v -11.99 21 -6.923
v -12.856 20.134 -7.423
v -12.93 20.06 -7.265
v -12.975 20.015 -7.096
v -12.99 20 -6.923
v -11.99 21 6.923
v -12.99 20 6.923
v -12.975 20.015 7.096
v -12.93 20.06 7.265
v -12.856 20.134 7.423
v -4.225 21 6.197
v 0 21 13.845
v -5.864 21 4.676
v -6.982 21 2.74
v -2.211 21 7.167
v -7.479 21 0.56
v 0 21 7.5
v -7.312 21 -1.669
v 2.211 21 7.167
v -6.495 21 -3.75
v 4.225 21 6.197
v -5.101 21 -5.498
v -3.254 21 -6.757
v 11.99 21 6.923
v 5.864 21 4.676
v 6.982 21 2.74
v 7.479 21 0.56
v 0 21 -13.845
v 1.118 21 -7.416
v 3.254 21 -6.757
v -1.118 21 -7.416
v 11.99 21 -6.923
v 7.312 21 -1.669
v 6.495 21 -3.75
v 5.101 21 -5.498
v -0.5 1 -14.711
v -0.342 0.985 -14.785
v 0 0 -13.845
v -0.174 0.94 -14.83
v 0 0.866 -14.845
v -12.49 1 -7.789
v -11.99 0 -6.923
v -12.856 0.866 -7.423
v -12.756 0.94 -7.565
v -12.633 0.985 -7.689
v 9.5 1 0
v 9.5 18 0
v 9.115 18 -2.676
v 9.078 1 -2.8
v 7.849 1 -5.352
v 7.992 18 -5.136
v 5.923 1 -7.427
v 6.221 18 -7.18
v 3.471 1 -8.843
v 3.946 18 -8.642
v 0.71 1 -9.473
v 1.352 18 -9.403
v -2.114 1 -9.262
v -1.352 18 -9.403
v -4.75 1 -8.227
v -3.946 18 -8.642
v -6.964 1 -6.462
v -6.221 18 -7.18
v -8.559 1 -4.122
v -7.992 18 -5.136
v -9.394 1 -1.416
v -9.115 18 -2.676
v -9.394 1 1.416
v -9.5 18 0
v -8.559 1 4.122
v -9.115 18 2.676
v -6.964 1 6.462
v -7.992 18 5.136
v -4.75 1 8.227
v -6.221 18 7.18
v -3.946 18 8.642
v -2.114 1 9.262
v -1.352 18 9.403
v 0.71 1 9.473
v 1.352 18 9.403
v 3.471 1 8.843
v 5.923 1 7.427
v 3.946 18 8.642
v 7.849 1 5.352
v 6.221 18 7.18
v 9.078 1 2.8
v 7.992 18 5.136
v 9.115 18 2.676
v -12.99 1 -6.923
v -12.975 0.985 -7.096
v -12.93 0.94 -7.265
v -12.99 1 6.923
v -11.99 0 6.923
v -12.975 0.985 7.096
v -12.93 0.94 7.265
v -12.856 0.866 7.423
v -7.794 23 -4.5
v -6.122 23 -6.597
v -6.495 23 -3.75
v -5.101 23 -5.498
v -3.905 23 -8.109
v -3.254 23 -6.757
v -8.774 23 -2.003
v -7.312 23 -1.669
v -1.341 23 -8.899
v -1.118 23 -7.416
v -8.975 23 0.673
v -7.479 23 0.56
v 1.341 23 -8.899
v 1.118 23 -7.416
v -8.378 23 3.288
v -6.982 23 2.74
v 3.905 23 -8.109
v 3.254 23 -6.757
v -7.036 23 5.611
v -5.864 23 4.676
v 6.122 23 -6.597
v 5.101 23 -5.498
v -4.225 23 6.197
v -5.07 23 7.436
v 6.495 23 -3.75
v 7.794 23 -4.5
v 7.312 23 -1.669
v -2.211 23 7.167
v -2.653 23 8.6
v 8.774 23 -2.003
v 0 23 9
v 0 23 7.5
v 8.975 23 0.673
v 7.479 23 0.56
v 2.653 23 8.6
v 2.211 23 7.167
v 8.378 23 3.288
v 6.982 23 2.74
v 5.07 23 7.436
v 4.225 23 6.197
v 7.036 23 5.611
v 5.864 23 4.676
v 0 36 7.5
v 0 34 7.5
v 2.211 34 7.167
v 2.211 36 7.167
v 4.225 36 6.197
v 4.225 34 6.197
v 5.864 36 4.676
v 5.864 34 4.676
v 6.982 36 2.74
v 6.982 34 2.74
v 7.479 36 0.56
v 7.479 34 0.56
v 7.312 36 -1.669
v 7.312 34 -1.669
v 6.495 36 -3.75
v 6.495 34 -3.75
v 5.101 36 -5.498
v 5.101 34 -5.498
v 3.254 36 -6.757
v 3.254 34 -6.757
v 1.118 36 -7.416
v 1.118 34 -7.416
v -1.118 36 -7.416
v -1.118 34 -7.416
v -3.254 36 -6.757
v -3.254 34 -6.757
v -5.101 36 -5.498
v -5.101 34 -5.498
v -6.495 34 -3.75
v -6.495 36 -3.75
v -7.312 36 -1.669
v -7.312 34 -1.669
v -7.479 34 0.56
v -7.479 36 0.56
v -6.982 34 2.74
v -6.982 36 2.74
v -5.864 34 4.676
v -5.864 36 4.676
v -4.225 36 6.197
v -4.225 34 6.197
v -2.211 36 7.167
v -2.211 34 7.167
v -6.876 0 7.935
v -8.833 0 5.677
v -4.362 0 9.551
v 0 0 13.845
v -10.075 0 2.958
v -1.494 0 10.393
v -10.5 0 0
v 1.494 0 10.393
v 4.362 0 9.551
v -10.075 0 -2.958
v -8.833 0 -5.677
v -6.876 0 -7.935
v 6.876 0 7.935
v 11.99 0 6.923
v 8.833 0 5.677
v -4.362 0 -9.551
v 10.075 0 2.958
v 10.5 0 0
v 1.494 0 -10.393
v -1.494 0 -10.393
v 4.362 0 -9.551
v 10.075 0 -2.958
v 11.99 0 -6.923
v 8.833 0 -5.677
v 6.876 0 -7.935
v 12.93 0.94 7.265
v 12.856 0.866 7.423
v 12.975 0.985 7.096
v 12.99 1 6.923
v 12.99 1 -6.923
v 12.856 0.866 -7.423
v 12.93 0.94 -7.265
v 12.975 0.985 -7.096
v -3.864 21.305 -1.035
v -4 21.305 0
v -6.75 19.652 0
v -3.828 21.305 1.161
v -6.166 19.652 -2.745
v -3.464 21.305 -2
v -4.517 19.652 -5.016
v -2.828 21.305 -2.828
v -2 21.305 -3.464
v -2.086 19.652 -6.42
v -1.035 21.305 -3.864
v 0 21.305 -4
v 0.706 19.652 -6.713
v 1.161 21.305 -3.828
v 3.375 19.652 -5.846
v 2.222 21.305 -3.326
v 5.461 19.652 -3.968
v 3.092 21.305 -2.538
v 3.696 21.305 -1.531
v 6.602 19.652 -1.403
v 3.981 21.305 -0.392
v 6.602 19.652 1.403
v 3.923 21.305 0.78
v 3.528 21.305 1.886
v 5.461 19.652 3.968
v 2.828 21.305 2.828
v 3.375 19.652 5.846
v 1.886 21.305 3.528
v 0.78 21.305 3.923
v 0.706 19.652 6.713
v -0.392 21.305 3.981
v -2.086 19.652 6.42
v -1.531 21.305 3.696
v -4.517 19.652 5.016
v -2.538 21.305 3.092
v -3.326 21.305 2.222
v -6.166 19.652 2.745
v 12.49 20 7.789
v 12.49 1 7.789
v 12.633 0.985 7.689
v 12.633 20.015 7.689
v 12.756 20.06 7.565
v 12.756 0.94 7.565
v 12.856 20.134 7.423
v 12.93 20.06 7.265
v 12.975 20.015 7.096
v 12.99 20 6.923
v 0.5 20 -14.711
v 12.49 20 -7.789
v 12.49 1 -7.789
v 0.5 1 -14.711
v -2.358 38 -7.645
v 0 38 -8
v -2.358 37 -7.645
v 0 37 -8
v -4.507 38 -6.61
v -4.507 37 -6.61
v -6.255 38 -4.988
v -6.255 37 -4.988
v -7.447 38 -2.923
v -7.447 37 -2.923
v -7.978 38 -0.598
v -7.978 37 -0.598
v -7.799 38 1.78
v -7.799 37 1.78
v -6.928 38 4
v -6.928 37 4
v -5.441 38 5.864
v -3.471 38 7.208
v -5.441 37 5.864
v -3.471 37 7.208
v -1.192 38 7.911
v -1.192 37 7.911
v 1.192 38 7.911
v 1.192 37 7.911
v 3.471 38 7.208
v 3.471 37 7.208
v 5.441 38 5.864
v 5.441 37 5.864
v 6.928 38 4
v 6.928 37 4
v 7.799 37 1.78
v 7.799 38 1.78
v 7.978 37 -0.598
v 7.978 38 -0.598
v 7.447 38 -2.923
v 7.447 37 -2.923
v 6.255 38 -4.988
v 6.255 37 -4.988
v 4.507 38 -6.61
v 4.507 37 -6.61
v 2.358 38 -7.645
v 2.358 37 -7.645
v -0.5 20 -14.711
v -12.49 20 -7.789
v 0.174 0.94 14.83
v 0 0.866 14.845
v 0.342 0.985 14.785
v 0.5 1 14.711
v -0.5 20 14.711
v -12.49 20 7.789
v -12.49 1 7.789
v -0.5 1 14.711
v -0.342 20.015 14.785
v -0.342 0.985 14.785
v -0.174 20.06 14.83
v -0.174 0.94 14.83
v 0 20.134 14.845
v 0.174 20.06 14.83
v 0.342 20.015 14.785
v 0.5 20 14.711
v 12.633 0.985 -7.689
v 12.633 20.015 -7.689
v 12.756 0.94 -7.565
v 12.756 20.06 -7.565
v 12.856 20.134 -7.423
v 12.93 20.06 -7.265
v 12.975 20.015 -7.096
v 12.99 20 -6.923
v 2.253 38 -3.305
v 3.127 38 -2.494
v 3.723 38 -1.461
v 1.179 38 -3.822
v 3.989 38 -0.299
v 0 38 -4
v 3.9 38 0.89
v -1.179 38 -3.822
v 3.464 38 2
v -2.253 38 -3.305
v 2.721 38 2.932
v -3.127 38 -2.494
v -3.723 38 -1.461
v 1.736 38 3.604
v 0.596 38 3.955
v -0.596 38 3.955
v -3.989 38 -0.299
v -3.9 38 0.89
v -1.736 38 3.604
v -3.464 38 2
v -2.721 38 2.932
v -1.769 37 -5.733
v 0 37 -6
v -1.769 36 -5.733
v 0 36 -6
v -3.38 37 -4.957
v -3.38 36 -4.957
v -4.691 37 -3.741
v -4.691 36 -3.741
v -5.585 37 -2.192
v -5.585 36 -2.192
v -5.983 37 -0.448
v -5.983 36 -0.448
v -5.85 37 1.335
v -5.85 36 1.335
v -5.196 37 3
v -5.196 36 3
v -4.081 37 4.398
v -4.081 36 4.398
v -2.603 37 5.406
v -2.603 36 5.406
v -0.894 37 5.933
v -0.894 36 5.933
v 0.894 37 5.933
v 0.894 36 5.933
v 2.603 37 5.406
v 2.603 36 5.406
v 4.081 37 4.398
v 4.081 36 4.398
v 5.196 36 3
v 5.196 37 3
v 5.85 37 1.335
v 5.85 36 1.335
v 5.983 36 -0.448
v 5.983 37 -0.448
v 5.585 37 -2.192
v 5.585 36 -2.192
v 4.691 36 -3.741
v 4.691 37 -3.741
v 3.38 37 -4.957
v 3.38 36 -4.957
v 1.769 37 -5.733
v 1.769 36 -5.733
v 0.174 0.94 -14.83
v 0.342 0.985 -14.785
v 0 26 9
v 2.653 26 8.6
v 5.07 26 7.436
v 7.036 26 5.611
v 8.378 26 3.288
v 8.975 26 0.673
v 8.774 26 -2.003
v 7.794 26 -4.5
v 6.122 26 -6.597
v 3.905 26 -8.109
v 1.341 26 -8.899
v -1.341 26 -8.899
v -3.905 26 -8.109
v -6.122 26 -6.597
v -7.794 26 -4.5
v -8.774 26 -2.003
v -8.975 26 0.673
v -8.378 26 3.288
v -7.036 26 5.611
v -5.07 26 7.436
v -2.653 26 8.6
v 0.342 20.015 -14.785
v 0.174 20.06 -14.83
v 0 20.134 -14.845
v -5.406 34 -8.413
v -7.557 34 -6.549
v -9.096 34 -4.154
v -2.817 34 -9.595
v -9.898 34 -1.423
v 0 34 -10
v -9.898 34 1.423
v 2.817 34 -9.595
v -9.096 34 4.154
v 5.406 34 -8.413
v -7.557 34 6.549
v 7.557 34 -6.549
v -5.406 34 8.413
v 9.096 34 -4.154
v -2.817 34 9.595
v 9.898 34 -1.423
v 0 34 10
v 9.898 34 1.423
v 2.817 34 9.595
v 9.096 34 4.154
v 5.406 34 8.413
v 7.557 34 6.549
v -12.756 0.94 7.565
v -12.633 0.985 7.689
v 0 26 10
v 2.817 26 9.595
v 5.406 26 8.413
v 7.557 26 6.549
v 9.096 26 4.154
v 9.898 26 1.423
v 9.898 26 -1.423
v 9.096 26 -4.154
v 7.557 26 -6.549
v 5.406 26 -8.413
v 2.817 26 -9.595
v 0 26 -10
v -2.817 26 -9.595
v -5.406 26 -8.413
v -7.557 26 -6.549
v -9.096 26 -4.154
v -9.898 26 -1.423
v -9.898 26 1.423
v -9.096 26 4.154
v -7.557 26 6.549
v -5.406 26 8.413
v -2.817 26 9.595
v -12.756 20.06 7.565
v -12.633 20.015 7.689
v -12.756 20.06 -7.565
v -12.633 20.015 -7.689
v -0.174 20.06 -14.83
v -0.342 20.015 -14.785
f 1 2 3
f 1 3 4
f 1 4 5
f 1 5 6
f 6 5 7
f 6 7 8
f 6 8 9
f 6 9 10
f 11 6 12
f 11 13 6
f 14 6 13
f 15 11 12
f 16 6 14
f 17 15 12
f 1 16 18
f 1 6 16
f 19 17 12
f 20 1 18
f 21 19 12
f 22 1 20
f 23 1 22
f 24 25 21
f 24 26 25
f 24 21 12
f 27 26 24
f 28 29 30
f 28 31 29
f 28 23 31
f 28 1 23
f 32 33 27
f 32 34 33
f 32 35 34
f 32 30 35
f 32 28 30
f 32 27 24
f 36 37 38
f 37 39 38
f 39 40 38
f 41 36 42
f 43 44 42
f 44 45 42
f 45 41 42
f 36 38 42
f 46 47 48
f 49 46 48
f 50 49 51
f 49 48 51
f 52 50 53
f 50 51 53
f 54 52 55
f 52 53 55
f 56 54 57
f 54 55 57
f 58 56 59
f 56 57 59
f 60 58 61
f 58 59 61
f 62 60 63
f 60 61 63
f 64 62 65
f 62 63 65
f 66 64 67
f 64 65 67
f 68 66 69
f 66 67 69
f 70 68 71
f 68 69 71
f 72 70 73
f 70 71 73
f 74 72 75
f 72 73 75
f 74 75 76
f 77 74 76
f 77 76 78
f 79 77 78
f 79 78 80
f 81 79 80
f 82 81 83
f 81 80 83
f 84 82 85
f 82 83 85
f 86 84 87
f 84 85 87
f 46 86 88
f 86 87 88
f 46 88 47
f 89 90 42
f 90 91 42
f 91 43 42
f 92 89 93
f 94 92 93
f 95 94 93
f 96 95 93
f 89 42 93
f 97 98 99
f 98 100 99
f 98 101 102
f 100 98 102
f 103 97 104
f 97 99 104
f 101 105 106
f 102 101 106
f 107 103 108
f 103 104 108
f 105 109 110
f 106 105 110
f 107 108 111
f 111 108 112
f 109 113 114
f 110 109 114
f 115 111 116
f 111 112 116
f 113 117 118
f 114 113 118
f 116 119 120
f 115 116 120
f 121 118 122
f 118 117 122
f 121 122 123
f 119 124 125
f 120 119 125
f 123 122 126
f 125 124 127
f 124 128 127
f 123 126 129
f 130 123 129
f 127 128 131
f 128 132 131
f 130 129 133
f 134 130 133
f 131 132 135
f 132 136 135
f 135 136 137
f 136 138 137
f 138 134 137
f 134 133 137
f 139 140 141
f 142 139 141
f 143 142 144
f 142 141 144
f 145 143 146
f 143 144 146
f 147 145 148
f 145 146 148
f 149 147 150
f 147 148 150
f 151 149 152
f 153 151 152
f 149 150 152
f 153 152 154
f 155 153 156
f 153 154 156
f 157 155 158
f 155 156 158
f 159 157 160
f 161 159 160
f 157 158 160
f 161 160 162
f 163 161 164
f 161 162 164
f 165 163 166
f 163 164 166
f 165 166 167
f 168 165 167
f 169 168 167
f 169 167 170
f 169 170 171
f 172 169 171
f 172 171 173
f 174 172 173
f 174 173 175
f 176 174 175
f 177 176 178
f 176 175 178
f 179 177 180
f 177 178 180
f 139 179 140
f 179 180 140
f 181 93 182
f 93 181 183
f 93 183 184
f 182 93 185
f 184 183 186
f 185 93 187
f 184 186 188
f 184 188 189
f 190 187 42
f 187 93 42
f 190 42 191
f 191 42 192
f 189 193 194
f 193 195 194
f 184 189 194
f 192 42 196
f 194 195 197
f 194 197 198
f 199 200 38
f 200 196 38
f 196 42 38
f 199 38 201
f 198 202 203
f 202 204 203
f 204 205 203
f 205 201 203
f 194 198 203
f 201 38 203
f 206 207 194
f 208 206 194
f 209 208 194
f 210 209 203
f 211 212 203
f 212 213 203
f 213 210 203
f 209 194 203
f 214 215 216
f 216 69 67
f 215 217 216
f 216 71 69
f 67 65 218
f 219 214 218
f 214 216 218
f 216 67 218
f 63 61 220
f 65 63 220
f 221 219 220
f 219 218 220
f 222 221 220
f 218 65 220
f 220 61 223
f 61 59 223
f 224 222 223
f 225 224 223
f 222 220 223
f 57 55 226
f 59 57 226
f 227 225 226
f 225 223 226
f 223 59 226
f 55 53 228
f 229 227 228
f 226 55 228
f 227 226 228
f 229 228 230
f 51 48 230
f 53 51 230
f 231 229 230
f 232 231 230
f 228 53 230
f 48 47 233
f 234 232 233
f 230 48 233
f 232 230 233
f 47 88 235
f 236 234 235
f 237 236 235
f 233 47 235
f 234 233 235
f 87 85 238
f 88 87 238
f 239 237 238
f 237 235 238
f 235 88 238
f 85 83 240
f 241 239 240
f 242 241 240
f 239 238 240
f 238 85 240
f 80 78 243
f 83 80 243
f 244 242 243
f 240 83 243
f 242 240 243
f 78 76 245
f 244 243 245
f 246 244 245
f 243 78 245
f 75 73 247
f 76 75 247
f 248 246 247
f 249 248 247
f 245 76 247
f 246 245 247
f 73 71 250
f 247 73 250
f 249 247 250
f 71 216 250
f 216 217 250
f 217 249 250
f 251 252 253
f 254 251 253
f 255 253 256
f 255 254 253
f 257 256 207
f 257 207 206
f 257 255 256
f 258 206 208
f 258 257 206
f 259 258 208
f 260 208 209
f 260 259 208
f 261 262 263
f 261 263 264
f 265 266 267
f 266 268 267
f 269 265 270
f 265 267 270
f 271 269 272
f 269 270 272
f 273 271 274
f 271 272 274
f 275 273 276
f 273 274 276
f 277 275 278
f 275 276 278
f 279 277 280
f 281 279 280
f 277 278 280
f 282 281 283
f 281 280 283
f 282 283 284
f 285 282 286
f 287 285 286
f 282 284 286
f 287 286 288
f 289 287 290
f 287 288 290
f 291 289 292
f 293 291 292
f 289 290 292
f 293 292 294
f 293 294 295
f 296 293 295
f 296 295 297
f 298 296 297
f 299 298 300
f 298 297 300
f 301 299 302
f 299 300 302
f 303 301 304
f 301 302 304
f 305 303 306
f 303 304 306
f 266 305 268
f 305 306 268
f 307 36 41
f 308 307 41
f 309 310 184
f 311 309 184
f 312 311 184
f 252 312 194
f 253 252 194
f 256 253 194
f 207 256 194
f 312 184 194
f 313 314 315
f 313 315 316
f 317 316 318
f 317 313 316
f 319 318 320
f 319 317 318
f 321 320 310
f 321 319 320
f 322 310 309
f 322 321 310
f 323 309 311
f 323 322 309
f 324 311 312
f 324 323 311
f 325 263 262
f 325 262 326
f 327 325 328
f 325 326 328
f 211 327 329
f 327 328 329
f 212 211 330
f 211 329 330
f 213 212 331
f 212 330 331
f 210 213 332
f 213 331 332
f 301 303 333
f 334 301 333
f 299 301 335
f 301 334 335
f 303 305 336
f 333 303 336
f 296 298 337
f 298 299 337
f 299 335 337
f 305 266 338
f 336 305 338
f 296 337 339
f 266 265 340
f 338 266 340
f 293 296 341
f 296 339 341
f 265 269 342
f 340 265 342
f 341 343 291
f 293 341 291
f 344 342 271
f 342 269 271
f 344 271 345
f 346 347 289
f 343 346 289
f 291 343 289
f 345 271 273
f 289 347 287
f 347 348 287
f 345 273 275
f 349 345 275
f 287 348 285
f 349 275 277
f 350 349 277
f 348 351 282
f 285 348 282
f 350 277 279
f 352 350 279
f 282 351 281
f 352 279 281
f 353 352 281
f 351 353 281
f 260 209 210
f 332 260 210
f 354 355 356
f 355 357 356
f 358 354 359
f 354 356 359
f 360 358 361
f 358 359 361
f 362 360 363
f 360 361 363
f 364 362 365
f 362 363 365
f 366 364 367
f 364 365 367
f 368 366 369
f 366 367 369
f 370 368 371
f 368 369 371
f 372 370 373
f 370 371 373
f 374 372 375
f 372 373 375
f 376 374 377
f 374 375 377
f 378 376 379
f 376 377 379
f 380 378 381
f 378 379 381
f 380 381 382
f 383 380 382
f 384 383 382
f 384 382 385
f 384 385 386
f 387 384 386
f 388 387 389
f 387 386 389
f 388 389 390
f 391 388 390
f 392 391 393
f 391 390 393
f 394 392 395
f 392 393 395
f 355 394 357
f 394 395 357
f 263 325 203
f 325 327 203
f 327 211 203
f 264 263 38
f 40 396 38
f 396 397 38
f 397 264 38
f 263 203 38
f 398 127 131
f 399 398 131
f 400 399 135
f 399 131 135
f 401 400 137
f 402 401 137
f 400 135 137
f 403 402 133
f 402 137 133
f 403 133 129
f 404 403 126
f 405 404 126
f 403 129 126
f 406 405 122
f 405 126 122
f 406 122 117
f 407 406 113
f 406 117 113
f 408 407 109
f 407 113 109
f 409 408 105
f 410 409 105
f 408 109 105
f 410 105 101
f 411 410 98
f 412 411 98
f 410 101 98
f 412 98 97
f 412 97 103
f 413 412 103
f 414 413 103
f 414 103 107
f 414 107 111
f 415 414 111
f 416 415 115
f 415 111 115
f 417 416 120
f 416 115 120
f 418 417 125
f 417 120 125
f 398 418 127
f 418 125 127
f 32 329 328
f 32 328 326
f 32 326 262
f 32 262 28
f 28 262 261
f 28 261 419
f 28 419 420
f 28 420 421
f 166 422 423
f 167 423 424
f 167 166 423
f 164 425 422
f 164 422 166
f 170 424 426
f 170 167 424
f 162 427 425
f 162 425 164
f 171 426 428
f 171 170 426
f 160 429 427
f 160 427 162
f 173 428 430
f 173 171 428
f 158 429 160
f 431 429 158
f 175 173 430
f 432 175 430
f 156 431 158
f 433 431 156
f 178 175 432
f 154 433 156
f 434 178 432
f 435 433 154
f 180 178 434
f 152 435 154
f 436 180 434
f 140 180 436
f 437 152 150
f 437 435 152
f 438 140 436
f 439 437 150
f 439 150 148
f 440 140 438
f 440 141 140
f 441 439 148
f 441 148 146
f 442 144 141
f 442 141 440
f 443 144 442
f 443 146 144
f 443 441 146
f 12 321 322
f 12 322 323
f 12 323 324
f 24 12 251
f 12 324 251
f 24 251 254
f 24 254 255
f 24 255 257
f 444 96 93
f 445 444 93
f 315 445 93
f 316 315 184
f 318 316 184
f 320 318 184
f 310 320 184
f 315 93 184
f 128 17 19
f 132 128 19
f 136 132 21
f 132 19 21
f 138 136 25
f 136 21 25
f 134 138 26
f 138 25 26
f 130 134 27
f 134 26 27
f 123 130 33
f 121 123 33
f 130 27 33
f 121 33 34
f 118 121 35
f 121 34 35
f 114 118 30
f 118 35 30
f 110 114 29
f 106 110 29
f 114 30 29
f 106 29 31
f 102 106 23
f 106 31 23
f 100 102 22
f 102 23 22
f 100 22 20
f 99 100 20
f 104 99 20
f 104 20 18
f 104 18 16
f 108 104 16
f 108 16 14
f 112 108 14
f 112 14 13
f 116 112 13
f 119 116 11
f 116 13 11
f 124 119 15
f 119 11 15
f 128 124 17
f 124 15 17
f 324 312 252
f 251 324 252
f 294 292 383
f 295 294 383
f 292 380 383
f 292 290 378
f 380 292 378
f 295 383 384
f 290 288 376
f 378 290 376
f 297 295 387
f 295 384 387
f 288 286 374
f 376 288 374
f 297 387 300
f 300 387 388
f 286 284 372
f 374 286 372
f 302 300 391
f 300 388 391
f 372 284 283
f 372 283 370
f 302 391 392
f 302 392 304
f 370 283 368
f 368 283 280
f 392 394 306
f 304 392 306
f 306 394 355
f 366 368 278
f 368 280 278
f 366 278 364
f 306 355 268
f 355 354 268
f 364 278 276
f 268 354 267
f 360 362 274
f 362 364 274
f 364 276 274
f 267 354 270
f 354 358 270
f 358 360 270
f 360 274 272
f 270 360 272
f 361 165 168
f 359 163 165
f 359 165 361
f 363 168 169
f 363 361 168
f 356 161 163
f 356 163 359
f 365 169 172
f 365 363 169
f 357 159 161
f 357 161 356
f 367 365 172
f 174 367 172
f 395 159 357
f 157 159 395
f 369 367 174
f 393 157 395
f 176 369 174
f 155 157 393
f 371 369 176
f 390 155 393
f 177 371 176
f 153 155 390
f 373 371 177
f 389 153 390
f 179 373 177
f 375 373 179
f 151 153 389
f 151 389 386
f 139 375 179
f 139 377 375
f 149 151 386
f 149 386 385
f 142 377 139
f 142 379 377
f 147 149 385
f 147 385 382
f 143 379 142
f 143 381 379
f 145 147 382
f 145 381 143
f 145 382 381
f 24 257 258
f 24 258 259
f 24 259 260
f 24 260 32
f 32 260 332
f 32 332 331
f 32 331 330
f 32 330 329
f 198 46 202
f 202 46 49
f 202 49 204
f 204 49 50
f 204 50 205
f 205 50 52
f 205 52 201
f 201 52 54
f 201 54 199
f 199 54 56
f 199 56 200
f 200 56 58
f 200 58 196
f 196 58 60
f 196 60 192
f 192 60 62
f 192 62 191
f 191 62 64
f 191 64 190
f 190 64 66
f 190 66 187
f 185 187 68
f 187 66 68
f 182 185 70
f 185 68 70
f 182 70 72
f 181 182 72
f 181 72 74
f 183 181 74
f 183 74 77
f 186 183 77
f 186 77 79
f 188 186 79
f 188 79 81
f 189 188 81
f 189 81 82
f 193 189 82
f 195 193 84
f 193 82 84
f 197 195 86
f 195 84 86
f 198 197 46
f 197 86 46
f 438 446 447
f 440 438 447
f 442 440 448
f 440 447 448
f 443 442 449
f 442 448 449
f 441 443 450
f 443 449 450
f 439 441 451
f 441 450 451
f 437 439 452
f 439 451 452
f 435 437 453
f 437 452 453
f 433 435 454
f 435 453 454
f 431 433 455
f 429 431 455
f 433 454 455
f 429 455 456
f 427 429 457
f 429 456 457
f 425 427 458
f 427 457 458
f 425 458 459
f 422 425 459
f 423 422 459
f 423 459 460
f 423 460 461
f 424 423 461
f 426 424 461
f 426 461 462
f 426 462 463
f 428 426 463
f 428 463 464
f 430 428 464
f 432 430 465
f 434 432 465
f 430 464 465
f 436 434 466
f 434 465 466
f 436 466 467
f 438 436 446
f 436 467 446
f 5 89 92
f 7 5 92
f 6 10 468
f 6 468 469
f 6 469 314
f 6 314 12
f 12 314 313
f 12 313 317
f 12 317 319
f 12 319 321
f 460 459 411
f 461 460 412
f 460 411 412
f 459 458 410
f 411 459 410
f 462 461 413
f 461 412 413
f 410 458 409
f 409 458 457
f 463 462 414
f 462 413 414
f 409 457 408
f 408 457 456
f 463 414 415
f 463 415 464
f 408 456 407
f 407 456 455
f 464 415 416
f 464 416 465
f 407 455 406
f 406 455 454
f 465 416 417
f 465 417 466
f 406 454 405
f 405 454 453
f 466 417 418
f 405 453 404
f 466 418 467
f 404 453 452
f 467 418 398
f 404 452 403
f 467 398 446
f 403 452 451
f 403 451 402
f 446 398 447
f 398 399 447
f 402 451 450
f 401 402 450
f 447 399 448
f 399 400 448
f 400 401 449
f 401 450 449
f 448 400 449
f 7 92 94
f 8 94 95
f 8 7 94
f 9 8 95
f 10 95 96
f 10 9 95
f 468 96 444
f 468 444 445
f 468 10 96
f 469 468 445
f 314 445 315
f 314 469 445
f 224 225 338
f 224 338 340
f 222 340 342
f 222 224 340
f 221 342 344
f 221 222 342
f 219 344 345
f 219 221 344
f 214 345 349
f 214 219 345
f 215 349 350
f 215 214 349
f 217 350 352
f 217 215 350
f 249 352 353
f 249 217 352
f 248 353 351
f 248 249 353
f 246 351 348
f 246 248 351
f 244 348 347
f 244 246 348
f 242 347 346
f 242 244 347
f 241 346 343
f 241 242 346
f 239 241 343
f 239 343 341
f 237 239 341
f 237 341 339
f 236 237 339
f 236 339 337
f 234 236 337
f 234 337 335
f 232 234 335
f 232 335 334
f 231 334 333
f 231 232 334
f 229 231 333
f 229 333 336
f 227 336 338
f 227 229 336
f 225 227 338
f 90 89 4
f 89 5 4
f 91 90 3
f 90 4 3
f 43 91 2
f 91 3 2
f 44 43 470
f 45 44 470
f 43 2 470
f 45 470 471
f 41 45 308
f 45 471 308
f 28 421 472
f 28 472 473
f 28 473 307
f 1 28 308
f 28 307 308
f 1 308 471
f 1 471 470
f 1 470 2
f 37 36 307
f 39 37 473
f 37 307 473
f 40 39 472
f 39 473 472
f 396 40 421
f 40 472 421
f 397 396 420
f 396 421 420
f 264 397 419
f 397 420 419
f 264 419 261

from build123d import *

# Parameters (mm, degrees)
EXTRUDE_1_DEPTH          = 21
SKETCH_2_R               = 7.5
EXTRUDE_2_DEPTH          = 2
SKETCH_3_R               = 9
EXTRUDE_3_DEPTH          = 3
SKETCH_4_R               = 10
EXTRUDE_4_DEPTH          = 8
SKETCH_5_R               = 7.5
EXTRUDE_5_DEPTH          = 2
CUT_EXTRUDE_1_DEPTH      = 42.106568818
CUT_EXTRUDE_1_DEPTH_BACK = 42.106568818
SKETCH_7_R               = 4
HOLE_WIZARD_G1_21_D      = 19
HOLE_WIZARD_G1_21_DEPTH  = 18
HOLE_WIZARD_G1_21_TIP    = 5.708175881
CHAMFER_1_SIZE           = 1
FILLET_1_R               = 1


with BuildPart() as part:
    # Эскиз1 → Бобышка-Вытянуть1 (new body)
    with BuildSketch(Plane(origin=(0, 0, 0), x_dir=(1, 0, 0), z_dir=(0, 1, 0))):
        Polygon((0, 15), (-12.990381057, 7.5), (-12.990381057, -7.5), (0, -15), (12.990381057, -7.5), (12.990381057, 7.5), align=None)
    extrude(amount=EXTRUDE_1_DEPTH)

    # Эскиз2 → Бобышка-Вытянуть2 (add)
    with BuildSketch(Plane(origin=(0, 21, 0), x_dir=(1, 0, 0), z_dir=(0, 1, 0))):
        with Locations(Location((0, 0, 0), (0, 0, 270))):
            Circle(SKETCH_2_R)
    extrude(amount=EXTRUDE_2_DEPTH)

    # Эскиз3 → Бобышка-Вытянуть3 (add)
    with BuildSketch(Plane(origin=(0, 23, 0), x_dir=(1, 0, 0), z_dir=(0, 1, 0))):
        with Locations(Location((0, 0, 0), (0, 0, 270))):
            Circle(SKETCH_3_R)
    extrude(amount=EXTRUDE_3_DEPTH)

    # Эскиз4 → Бобышка-Вытянуть4 (add)
    with BuildSketch(Plane(origin=(0, 26, 0), x_dir=(1, 0, 0), z_dir=(0, 1, 0))):
        with Locations(Location((0, 0, 0), (0, 0, 270))):
            Circle(SKETCH_4_R)
    extrude(amount=EXTRUDE_4_DEPTH)

    # Эскиз5 → Бобышка-Вытянуть5 (add)
    with BuildSketch(Plane(origin=(0, 34, 0), x_dir=(1, 0, 0), z_dir=(0, 1, 0))):
        with Locations(Location((0, 0, 0), (0, 0, 270))):
            Circle(SKETCH_5_R)
    extrude(amount=EXTRUDE_5_DEPTH)

    # Эскиз6 → Повернуть1 (revolve)
    with BuildSketch(Plane.XY, mode=Mode.PRIVATE) as revolve_1_sk:
        Polygon((-8, 37), (-6, 37), (-6, 36), (-4, 36), (-4, 38), (-8, 38), align=None)
    revolve(revolve_1_sk.sketch.rotate(Axis((0, 36, 0), (0, 1, 0)), 270), axis=Axis((0, 36, 0), (0, 1, 0)))

    # Эскиз7 → Вырез-Вытянуть1 (cut, two sides: drawn at the far end of the back side and taken through both)
    with BuildSketch(Plane(origin=(0, 36, 0), x_dir=(1, 0, 0), z_dir=(0, 1, 0)).offset(-CUT_EXTRUDE_1_DEPTH_BACK)):
        with Locations(Location((0, 0, 0), (0, 0, 90))):
            Circle(SKETCH_7_R)
    extrude(amount=CUT_EXTRUDE_1_DEPTH + CUT_EXTRUDE_1_DEPTH_BACK, mode=Mode.SUBTRACT)

    # Отверстие обработанное метчиком G1/21
    with Locations(Plane(origin=(0, 0, 0), x_dir=(-1, 0, 0), z_dir=(0, -1, 0))):
        with Locations((0, 0)):
            Hole(HOLE_WIZARD_G1_21_D / 2, depth=HOLE_WIZARD_G1_21_DEPTH)
            with Locations((0, 0, -(HOLE_WIZARD_G1_21_DEPTH + HOLE_WIZARD_G1_21_TIP / 2))):  # 118° drill point
                Cone(0, HOLE_WIZARD_G1_21_D / 2, HOLE_WIZARD_G1_21_TIP, mode=Mode.SUBTRACT)

    # Фаска1
    chamfer_1_edges = [part.edges().sort_by_distance(p)[0] for p in [
        (-12.990381057, 21, 0),
        (-6.495190528, 21, 11.25),
        (6.495190528, 21, 11.25),
        (12.990381057, 21, 0),
        (6.495190528, 21, -11.25),
        (-9.5, 0, 0),
        (12.990381057, 0, 0),
        (6.495190528, 0, 11.25),
        (-6.495190528, 0, 11.25),
        (-6.495190528, 21, -11.25),
        (-12.990381057, 0, 0),
        (-6.495190528, 0, -11.25),
        (6.495190528, 0, -11.25),
    ]]
    chamfer(chamfer_1_edges, length=CHAMFER_1_SIZE)

    # Скругление1
    fillet_1_edges = [part.edges().sort_by_distance(p)[0] for p in [
        (12.990381057, 10.5, -7.5),
        (12.990381057, 10.5, 7.5),
        (0, 10.5, 15),
        (-12.990381057, 10.5, 7.5),
        (-12.990381057, 10.5, -7.5),
        (0, 10.5, -15),
    ]]
    fillet(fillet_1_edges, radius=FILLET_1_R)


solid = part.part
